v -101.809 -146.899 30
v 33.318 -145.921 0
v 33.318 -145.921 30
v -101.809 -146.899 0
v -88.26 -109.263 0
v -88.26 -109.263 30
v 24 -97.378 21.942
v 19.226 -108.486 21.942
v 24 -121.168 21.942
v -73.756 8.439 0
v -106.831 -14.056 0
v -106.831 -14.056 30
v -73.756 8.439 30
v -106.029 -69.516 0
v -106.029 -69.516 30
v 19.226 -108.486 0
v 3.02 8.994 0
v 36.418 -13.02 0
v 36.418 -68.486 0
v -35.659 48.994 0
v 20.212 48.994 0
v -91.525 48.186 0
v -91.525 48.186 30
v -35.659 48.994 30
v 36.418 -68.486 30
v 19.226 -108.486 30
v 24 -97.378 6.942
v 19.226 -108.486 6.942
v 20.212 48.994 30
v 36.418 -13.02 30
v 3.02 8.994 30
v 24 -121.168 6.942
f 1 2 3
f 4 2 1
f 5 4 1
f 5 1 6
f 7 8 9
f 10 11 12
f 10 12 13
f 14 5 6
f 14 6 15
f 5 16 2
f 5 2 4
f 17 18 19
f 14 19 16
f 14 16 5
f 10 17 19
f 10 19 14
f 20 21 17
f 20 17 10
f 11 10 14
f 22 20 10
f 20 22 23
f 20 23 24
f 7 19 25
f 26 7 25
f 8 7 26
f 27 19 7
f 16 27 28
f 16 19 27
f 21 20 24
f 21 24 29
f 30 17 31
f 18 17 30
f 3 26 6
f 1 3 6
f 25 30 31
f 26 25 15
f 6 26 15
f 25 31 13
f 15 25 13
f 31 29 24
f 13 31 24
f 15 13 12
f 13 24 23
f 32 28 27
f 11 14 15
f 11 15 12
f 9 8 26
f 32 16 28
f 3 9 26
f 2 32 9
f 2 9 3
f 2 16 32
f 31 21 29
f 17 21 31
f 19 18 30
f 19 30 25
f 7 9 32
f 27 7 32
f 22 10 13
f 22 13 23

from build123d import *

# Parameters (mm, degrees)
BOSS_EXTRUDE1_DEPTH = 30
SKETCH6_W           = 15
SKETCH6_H           = 30
BOSS_EXTRUDE2_DEPTH = 24


with BuildPart() as part:
    # Sketch2 → Boss-Extrude1 (new body)
    with BuildSketch(Plane.XY):
        Polygon((-35.659220441, 48.994166095), (20.212047263, 48.994166095), (3.020324726, 8.994166095), (36.417587641, -13.019984577), (36.417587641, -68.485610583), (19.225865104, -108.485610583), (33.318130441, -145.920995684), (-101.80917988, -146.898605829), (-88.260031439, -109.263242453), (-106.02870282, -69.516171603), (-106.831218915, -14.056351587), (-73.755968311, 8.438710038), (-91.524639692, 48.185780888), align=None)
    extrude(amount=BOSS_EXTRUDE1_DEPTH)

    # Sketch6 → Boss-Extrude2 (add)
    with BuildSketch(Plane(origin=(0, 0, 0), x_dir=(0, 0, -1), z_dir=(1, 0, 0))):
        with Locations((-14.441506787, -108.571370402)):
            Rectangle(SKETCH6_W, SKETCH6_H)
    extrude(amount=BOSS_EXTRUDE2_DEPTH)


solid = part.part
